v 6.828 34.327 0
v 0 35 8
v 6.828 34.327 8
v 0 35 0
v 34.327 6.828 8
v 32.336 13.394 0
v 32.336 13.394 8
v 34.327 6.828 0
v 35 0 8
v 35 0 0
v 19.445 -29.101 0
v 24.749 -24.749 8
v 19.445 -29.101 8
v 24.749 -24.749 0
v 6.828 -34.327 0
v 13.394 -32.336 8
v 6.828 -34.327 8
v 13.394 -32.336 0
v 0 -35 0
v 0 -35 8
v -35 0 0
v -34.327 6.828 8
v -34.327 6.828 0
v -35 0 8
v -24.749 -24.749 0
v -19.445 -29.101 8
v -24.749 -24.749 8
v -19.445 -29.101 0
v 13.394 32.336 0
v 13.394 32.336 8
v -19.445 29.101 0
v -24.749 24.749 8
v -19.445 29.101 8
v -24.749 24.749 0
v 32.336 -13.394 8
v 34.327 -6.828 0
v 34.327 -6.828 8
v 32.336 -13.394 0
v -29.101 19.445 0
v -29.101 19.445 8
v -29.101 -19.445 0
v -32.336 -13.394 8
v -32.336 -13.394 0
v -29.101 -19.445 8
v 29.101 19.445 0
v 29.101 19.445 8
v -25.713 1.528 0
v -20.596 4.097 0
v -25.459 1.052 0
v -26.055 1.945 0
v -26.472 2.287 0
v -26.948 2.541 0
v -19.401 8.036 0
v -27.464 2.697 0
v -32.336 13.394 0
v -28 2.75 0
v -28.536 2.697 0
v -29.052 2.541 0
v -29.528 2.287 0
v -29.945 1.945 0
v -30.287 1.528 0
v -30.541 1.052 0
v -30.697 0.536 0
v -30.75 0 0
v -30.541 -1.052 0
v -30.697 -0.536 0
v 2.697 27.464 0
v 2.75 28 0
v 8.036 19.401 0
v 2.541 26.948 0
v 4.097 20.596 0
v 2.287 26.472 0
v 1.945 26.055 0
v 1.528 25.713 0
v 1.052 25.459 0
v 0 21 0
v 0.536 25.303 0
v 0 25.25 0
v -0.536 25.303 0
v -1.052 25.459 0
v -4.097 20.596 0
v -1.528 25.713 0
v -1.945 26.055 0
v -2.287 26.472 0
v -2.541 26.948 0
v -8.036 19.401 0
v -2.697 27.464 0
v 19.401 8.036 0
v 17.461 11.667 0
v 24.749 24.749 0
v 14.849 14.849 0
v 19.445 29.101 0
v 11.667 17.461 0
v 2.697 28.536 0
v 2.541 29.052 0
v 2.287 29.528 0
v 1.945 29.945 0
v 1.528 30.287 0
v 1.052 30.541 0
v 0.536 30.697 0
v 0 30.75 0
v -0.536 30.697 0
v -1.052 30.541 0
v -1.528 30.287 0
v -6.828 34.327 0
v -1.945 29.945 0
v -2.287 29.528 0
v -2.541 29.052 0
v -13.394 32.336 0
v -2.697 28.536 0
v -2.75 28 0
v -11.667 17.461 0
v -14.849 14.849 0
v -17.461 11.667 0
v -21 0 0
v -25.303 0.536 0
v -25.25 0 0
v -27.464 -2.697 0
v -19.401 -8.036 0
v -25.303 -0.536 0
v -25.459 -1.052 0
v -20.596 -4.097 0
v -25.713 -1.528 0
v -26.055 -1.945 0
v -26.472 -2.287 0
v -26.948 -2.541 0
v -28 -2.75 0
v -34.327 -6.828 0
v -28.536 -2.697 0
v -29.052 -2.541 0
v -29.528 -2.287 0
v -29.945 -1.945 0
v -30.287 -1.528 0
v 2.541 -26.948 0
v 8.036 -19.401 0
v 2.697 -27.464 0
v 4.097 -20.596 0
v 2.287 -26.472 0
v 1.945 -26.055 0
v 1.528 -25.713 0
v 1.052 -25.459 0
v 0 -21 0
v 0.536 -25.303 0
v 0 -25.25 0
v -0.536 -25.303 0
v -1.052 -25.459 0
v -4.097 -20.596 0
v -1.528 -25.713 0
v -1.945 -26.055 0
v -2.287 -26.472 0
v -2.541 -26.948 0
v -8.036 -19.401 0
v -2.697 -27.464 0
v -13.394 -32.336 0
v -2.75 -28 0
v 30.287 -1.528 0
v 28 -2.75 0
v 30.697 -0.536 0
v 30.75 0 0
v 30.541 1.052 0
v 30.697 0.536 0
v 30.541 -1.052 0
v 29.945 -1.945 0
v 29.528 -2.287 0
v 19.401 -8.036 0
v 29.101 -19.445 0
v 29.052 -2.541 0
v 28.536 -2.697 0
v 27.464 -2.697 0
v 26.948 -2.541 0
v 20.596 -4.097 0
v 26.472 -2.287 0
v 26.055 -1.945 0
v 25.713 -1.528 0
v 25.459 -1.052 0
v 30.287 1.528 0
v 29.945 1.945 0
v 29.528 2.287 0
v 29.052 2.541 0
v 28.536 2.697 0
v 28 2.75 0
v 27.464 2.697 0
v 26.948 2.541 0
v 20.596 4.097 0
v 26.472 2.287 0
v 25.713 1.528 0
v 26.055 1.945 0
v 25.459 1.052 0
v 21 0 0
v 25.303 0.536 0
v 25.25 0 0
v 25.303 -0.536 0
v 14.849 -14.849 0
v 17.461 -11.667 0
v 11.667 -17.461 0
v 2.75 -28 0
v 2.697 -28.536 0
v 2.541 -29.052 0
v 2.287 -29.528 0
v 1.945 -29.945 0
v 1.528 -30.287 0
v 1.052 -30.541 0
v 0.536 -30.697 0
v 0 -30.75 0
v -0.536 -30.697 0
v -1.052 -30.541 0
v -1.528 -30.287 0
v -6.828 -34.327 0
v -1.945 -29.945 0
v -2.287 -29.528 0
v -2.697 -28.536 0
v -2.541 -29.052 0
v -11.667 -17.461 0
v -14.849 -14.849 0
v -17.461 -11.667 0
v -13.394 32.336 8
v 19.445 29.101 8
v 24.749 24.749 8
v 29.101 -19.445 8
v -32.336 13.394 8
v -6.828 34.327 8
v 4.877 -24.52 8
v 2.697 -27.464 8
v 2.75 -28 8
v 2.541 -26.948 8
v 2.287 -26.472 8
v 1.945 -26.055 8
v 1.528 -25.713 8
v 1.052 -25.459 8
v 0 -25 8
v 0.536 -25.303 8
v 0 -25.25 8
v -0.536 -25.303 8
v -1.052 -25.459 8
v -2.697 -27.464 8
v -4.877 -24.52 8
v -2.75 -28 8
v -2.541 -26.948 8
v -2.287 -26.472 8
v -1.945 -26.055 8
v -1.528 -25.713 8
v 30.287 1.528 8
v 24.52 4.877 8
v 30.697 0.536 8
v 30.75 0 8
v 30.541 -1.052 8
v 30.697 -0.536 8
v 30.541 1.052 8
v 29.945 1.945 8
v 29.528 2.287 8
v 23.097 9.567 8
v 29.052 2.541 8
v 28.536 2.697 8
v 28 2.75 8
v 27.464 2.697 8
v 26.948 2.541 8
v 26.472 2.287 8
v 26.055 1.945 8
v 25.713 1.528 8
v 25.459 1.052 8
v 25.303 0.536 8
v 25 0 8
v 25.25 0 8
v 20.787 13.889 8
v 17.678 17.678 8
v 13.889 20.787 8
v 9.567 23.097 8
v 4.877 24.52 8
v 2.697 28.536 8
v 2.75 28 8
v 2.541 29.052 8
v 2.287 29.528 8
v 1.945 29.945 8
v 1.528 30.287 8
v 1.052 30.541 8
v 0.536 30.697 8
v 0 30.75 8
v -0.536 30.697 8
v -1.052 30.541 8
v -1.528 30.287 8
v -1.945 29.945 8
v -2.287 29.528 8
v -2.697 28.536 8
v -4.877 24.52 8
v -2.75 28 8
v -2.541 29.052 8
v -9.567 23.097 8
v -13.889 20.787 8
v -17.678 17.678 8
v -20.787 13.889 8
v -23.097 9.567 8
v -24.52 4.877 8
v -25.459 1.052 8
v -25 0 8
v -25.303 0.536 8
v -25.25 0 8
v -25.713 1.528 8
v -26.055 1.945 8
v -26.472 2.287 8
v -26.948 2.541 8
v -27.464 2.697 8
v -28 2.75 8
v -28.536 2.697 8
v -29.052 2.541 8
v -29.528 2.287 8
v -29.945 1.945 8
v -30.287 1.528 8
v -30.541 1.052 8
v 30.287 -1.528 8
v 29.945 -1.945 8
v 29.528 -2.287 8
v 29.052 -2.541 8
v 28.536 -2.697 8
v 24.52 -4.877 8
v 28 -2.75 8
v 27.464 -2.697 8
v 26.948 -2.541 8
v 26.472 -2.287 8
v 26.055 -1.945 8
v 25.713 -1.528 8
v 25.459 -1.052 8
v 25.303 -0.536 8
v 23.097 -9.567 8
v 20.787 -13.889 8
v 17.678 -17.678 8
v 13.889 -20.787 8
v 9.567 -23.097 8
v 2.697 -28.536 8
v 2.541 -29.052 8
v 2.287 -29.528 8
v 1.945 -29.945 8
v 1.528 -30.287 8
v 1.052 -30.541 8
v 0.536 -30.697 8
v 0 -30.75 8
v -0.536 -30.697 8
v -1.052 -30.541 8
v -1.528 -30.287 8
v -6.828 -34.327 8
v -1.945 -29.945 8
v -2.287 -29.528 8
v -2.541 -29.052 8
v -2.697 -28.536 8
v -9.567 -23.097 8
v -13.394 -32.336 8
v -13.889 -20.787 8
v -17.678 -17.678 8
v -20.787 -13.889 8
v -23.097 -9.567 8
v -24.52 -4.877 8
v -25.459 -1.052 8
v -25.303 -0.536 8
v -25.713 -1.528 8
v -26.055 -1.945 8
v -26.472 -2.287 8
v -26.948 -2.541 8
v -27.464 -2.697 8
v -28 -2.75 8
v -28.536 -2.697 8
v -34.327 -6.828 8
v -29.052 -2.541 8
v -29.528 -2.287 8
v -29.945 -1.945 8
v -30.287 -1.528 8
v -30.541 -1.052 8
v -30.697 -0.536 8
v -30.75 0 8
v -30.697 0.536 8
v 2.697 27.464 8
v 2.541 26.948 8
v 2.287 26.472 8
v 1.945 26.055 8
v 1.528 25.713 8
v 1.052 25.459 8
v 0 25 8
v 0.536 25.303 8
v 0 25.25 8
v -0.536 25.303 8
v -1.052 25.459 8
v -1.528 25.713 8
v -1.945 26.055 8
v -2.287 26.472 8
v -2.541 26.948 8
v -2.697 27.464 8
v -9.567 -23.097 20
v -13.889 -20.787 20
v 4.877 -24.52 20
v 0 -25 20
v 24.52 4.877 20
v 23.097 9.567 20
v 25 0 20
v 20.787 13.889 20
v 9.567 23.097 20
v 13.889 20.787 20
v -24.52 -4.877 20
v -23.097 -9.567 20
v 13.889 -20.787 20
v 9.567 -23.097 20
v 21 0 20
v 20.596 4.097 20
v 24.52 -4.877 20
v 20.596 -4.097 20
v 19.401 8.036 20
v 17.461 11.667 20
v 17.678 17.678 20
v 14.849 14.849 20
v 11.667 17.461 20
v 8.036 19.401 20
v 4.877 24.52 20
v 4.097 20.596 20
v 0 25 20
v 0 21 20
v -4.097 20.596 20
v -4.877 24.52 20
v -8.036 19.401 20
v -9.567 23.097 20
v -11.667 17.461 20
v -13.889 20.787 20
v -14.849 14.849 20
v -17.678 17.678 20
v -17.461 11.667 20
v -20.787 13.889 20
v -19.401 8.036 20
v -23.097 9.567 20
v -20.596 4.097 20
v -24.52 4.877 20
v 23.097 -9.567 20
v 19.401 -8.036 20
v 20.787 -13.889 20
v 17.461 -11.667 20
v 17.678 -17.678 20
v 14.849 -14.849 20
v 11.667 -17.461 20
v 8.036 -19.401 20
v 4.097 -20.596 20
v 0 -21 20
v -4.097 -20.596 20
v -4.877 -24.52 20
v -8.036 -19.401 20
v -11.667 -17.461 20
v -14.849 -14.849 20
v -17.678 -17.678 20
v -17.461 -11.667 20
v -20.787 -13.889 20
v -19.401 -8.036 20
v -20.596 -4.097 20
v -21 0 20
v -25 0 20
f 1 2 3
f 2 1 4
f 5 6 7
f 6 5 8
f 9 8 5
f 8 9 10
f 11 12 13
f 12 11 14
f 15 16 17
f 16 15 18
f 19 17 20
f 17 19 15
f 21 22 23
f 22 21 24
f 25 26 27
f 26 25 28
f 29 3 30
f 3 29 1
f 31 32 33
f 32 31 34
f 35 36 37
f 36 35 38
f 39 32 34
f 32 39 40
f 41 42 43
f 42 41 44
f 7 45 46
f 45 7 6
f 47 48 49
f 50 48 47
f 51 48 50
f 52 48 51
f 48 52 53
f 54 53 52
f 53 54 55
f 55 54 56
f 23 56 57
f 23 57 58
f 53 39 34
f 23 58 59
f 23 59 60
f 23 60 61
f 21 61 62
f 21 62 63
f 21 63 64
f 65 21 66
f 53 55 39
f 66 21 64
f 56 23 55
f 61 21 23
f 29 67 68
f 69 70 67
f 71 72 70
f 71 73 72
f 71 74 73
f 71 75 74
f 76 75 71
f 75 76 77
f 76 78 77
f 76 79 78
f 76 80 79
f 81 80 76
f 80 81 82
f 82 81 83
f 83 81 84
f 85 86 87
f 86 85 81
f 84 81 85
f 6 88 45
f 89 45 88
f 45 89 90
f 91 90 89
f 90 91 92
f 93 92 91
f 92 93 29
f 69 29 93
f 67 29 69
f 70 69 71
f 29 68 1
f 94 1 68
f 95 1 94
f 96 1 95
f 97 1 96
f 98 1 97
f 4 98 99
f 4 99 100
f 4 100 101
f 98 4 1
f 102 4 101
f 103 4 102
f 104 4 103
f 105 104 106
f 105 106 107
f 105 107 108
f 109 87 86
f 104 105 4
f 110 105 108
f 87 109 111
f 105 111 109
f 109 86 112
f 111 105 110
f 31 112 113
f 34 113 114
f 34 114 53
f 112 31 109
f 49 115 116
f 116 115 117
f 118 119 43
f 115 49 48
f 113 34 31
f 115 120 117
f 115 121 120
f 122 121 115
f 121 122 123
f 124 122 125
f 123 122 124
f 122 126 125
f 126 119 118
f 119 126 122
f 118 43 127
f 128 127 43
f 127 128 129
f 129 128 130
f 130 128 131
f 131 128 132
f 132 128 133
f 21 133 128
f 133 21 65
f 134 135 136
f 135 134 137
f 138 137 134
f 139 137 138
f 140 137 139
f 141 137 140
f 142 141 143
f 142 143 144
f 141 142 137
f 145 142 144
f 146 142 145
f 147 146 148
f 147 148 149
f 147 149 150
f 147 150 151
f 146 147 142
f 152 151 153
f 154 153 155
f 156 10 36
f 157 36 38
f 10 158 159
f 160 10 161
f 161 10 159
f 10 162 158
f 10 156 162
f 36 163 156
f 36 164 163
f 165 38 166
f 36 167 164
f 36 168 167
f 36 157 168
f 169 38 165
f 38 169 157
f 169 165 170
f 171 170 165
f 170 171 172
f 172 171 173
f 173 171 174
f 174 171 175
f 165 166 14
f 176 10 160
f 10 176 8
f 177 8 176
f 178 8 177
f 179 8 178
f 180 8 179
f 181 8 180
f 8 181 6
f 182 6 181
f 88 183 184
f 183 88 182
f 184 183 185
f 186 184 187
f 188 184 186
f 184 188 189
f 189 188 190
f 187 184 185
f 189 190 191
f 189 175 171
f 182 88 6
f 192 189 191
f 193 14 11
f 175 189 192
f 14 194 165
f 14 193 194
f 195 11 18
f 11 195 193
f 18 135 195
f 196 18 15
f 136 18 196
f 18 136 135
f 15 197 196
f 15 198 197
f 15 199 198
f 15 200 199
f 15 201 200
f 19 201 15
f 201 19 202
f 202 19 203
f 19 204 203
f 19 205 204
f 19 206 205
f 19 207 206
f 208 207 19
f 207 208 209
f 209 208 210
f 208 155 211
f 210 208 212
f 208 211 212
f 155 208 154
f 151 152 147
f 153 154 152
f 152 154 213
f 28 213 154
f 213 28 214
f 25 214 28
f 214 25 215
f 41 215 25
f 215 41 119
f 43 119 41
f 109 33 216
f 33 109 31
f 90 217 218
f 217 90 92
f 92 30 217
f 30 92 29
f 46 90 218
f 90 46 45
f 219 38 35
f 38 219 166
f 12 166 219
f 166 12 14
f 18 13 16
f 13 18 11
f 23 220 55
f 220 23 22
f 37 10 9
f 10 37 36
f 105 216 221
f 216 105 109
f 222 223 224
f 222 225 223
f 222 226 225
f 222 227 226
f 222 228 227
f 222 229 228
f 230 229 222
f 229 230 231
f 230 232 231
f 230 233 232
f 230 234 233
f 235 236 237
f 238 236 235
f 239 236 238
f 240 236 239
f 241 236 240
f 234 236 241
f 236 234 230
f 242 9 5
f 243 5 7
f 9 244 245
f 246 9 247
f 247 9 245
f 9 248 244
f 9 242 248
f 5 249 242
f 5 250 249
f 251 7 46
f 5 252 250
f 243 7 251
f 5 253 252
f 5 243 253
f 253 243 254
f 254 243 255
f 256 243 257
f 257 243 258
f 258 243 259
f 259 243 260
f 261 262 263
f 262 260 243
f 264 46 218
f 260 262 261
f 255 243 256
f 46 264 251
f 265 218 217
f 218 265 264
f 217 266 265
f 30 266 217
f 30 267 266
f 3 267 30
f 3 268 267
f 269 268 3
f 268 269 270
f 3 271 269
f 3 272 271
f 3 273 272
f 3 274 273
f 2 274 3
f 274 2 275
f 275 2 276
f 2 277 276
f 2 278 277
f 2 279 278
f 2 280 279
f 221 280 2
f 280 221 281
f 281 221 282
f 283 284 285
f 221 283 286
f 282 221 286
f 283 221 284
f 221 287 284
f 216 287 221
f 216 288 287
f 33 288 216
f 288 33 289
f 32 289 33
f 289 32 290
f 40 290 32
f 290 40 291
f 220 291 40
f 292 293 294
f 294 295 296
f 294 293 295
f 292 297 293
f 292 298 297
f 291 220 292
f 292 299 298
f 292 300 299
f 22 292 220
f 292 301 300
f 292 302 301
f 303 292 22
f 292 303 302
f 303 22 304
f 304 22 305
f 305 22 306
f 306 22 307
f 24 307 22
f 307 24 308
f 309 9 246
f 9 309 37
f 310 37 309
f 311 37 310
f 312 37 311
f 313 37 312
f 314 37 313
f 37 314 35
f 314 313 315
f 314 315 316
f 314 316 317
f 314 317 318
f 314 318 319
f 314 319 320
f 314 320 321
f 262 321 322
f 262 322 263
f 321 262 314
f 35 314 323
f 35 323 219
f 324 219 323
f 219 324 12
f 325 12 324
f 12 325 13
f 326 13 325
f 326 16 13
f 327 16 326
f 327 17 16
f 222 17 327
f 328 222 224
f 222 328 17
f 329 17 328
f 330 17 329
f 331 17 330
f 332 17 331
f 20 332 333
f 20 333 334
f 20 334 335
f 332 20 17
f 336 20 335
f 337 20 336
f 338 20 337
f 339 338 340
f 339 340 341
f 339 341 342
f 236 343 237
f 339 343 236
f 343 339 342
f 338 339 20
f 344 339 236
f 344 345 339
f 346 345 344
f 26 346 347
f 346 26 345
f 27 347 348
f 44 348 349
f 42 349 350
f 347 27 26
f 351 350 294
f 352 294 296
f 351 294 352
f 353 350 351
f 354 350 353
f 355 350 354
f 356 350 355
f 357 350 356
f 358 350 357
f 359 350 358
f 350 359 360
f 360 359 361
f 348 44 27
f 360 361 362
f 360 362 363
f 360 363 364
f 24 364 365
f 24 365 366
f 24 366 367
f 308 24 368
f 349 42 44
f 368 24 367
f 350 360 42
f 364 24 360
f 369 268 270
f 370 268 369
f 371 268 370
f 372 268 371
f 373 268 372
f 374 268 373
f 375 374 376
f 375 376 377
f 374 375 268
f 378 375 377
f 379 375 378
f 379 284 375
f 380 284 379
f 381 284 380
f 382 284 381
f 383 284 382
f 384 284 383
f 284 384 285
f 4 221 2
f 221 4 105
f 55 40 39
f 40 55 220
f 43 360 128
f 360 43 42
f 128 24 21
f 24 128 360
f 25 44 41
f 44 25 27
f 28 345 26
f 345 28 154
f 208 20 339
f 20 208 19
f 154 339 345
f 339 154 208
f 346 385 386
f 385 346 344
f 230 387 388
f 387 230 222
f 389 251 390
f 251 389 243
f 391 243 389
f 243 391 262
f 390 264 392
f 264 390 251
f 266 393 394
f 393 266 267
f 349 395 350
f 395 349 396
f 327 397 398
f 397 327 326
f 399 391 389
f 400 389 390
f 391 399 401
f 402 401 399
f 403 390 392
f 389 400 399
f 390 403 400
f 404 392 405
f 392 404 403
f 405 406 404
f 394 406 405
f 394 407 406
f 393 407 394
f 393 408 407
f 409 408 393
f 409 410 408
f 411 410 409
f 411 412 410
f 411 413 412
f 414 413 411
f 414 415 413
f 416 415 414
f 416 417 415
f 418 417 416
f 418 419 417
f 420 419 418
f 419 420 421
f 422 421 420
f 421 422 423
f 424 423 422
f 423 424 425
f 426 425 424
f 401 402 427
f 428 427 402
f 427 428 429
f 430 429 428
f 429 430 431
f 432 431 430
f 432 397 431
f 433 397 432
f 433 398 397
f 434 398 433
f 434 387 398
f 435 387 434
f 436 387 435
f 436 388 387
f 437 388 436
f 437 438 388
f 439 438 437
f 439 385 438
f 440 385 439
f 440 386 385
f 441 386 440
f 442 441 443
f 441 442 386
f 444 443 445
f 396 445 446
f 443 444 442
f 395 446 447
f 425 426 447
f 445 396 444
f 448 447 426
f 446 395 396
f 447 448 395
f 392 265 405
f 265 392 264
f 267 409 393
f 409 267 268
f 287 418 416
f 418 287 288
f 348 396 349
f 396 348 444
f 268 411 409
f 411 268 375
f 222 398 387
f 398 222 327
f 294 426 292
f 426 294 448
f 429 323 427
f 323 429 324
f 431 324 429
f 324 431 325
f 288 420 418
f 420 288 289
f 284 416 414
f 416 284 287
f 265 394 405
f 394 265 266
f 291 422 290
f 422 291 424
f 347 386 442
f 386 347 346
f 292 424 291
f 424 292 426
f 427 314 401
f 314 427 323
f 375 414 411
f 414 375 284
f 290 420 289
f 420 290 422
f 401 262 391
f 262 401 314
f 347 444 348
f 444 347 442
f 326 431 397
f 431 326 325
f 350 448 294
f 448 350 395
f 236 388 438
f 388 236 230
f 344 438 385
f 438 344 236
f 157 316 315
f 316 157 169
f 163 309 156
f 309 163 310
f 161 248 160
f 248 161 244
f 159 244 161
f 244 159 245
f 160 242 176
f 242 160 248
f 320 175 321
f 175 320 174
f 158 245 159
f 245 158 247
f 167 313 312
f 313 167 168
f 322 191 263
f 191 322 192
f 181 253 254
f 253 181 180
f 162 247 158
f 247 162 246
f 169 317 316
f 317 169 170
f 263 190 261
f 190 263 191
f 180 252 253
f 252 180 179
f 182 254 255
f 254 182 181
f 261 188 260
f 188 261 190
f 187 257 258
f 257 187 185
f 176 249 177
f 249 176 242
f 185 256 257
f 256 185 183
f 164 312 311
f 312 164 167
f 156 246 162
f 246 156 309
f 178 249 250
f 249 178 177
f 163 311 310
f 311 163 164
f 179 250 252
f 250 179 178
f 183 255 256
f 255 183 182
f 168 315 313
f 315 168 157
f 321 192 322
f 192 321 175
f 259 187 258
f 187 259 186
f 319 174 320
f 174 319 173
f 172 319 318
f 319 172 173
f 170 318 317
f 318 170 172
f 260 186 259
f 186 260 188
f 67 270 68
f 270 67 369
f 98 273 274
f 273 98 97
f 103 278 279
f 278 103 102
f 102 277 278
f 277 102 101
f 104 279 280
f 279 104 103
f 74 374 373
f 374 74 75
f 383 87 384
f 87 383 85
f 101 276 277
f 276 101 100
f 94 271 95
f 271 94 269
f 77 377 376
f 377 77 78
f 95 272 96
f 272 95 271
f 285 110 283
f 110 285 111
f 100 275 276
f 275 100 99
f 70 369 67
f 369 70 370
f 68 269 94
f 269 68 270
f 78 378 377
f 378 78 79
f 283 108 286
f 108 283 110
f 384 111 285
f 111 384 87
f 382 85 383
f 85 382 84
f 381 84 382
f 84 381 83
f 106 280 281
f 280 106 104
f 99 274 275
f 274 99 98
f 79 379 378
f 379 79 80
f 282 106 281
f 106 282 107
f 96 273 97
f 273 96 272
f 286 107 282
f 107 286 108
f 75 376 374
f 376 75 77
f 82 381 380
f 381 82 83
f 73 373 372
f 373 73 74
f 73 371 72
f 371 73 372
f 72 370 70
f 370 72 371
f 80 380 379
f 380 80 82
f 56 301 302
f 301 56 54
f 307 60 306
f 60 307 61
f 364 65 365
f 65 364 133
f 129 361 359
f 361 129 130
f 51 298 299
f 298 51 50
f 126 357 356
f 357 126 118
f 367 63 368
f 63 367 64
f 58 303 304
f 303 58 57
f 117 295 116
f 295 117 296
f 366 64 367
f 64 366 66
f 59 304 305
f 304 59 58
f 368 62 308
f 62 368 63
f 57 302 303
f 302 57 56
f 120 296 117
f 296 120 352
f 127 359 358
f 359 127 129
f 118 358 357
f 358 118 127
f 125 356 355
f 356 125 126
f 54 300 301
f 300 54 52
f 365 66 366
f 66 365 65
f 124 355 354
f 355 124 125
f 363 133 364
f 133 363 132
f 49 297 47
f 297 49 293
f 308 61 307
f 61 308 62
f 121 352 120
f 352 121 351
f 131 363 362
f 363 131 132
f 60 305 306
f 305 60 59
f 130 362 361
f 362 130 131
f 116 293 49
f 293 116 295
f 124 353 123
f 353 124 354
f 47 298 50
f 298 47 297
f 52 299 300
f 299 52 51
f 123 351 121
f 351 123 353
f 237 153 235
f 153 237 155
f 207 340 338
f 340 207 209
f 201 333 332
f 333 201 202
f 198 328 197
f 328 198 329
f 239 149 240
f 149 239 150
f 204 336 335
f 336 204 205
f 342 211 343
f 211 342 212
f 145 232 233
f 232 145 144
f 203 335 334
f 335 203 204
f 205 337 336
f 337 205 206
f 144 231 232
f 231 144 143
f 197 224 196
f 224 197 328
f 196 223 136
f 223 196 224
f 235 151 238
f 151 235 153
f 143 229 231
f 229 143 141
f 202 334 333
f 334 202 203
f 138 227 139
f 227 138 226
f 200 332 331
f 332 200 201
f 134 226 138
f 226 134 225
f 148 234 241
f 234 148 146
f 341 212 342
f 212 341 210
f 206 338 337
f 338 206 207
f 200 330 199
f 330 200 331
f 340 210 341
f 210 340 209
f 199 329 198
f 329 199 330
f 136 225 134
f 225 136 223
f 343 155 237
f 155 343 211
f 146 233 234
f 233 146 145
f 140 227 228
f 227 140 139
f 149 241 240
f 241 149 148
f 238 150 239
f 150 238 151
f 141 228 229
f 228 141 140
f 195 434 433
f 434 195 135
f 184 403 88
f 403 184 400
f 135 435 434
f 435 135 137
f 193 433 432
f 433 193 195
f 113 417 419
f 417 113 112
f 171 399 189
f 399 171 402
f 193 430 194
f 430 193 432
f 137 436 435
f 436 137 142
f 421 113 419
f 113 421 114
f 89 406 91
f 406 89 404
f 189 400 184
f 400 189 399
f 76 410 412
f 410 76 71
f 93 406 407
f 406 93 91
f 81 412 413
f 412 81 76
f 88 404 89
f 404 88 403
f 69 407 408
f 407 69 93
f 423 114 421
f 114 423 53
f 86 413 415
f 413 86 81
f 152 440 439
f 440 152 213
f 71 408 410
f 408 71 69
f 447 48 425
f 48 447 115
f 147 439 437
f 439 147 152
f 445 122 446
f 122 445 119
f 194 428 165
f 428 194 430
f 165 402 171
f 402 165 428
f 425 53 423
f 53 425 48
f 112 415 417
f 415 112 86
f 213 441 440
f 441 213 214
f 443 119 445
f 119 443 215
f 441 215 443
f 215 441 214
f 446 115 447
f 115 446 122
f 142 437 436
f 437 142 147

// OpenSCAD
$fn = 32;
// Round pipe flange with a 12 mm neck.

bore_d = 42;
outer_d = 70;
bolt_circle = 56;
bolt_n = 4;
bolt_d = 5.5;
flange_t = 8;
neck_l = 12;
neck_d = bore_d + 8;

difference() {
    union() {
        cylinder(h = flange_t, d = outer_d);
        translate([0, 0, flange_t]) cylinder(h = neck_l, d = neck_d);
    }
    translate([0, 0, -1]) cylinder(h = flange_t + neck_l + 2, d = bore_d);
    for (i = [0 : bolt_n - 1])
        rotate([0, 0, i * 360 / bolt_n])
            translate([bolt_circle / 2, 0, -1])
                cylinder(h = flange_t + 2, d = bolt_d);
}
